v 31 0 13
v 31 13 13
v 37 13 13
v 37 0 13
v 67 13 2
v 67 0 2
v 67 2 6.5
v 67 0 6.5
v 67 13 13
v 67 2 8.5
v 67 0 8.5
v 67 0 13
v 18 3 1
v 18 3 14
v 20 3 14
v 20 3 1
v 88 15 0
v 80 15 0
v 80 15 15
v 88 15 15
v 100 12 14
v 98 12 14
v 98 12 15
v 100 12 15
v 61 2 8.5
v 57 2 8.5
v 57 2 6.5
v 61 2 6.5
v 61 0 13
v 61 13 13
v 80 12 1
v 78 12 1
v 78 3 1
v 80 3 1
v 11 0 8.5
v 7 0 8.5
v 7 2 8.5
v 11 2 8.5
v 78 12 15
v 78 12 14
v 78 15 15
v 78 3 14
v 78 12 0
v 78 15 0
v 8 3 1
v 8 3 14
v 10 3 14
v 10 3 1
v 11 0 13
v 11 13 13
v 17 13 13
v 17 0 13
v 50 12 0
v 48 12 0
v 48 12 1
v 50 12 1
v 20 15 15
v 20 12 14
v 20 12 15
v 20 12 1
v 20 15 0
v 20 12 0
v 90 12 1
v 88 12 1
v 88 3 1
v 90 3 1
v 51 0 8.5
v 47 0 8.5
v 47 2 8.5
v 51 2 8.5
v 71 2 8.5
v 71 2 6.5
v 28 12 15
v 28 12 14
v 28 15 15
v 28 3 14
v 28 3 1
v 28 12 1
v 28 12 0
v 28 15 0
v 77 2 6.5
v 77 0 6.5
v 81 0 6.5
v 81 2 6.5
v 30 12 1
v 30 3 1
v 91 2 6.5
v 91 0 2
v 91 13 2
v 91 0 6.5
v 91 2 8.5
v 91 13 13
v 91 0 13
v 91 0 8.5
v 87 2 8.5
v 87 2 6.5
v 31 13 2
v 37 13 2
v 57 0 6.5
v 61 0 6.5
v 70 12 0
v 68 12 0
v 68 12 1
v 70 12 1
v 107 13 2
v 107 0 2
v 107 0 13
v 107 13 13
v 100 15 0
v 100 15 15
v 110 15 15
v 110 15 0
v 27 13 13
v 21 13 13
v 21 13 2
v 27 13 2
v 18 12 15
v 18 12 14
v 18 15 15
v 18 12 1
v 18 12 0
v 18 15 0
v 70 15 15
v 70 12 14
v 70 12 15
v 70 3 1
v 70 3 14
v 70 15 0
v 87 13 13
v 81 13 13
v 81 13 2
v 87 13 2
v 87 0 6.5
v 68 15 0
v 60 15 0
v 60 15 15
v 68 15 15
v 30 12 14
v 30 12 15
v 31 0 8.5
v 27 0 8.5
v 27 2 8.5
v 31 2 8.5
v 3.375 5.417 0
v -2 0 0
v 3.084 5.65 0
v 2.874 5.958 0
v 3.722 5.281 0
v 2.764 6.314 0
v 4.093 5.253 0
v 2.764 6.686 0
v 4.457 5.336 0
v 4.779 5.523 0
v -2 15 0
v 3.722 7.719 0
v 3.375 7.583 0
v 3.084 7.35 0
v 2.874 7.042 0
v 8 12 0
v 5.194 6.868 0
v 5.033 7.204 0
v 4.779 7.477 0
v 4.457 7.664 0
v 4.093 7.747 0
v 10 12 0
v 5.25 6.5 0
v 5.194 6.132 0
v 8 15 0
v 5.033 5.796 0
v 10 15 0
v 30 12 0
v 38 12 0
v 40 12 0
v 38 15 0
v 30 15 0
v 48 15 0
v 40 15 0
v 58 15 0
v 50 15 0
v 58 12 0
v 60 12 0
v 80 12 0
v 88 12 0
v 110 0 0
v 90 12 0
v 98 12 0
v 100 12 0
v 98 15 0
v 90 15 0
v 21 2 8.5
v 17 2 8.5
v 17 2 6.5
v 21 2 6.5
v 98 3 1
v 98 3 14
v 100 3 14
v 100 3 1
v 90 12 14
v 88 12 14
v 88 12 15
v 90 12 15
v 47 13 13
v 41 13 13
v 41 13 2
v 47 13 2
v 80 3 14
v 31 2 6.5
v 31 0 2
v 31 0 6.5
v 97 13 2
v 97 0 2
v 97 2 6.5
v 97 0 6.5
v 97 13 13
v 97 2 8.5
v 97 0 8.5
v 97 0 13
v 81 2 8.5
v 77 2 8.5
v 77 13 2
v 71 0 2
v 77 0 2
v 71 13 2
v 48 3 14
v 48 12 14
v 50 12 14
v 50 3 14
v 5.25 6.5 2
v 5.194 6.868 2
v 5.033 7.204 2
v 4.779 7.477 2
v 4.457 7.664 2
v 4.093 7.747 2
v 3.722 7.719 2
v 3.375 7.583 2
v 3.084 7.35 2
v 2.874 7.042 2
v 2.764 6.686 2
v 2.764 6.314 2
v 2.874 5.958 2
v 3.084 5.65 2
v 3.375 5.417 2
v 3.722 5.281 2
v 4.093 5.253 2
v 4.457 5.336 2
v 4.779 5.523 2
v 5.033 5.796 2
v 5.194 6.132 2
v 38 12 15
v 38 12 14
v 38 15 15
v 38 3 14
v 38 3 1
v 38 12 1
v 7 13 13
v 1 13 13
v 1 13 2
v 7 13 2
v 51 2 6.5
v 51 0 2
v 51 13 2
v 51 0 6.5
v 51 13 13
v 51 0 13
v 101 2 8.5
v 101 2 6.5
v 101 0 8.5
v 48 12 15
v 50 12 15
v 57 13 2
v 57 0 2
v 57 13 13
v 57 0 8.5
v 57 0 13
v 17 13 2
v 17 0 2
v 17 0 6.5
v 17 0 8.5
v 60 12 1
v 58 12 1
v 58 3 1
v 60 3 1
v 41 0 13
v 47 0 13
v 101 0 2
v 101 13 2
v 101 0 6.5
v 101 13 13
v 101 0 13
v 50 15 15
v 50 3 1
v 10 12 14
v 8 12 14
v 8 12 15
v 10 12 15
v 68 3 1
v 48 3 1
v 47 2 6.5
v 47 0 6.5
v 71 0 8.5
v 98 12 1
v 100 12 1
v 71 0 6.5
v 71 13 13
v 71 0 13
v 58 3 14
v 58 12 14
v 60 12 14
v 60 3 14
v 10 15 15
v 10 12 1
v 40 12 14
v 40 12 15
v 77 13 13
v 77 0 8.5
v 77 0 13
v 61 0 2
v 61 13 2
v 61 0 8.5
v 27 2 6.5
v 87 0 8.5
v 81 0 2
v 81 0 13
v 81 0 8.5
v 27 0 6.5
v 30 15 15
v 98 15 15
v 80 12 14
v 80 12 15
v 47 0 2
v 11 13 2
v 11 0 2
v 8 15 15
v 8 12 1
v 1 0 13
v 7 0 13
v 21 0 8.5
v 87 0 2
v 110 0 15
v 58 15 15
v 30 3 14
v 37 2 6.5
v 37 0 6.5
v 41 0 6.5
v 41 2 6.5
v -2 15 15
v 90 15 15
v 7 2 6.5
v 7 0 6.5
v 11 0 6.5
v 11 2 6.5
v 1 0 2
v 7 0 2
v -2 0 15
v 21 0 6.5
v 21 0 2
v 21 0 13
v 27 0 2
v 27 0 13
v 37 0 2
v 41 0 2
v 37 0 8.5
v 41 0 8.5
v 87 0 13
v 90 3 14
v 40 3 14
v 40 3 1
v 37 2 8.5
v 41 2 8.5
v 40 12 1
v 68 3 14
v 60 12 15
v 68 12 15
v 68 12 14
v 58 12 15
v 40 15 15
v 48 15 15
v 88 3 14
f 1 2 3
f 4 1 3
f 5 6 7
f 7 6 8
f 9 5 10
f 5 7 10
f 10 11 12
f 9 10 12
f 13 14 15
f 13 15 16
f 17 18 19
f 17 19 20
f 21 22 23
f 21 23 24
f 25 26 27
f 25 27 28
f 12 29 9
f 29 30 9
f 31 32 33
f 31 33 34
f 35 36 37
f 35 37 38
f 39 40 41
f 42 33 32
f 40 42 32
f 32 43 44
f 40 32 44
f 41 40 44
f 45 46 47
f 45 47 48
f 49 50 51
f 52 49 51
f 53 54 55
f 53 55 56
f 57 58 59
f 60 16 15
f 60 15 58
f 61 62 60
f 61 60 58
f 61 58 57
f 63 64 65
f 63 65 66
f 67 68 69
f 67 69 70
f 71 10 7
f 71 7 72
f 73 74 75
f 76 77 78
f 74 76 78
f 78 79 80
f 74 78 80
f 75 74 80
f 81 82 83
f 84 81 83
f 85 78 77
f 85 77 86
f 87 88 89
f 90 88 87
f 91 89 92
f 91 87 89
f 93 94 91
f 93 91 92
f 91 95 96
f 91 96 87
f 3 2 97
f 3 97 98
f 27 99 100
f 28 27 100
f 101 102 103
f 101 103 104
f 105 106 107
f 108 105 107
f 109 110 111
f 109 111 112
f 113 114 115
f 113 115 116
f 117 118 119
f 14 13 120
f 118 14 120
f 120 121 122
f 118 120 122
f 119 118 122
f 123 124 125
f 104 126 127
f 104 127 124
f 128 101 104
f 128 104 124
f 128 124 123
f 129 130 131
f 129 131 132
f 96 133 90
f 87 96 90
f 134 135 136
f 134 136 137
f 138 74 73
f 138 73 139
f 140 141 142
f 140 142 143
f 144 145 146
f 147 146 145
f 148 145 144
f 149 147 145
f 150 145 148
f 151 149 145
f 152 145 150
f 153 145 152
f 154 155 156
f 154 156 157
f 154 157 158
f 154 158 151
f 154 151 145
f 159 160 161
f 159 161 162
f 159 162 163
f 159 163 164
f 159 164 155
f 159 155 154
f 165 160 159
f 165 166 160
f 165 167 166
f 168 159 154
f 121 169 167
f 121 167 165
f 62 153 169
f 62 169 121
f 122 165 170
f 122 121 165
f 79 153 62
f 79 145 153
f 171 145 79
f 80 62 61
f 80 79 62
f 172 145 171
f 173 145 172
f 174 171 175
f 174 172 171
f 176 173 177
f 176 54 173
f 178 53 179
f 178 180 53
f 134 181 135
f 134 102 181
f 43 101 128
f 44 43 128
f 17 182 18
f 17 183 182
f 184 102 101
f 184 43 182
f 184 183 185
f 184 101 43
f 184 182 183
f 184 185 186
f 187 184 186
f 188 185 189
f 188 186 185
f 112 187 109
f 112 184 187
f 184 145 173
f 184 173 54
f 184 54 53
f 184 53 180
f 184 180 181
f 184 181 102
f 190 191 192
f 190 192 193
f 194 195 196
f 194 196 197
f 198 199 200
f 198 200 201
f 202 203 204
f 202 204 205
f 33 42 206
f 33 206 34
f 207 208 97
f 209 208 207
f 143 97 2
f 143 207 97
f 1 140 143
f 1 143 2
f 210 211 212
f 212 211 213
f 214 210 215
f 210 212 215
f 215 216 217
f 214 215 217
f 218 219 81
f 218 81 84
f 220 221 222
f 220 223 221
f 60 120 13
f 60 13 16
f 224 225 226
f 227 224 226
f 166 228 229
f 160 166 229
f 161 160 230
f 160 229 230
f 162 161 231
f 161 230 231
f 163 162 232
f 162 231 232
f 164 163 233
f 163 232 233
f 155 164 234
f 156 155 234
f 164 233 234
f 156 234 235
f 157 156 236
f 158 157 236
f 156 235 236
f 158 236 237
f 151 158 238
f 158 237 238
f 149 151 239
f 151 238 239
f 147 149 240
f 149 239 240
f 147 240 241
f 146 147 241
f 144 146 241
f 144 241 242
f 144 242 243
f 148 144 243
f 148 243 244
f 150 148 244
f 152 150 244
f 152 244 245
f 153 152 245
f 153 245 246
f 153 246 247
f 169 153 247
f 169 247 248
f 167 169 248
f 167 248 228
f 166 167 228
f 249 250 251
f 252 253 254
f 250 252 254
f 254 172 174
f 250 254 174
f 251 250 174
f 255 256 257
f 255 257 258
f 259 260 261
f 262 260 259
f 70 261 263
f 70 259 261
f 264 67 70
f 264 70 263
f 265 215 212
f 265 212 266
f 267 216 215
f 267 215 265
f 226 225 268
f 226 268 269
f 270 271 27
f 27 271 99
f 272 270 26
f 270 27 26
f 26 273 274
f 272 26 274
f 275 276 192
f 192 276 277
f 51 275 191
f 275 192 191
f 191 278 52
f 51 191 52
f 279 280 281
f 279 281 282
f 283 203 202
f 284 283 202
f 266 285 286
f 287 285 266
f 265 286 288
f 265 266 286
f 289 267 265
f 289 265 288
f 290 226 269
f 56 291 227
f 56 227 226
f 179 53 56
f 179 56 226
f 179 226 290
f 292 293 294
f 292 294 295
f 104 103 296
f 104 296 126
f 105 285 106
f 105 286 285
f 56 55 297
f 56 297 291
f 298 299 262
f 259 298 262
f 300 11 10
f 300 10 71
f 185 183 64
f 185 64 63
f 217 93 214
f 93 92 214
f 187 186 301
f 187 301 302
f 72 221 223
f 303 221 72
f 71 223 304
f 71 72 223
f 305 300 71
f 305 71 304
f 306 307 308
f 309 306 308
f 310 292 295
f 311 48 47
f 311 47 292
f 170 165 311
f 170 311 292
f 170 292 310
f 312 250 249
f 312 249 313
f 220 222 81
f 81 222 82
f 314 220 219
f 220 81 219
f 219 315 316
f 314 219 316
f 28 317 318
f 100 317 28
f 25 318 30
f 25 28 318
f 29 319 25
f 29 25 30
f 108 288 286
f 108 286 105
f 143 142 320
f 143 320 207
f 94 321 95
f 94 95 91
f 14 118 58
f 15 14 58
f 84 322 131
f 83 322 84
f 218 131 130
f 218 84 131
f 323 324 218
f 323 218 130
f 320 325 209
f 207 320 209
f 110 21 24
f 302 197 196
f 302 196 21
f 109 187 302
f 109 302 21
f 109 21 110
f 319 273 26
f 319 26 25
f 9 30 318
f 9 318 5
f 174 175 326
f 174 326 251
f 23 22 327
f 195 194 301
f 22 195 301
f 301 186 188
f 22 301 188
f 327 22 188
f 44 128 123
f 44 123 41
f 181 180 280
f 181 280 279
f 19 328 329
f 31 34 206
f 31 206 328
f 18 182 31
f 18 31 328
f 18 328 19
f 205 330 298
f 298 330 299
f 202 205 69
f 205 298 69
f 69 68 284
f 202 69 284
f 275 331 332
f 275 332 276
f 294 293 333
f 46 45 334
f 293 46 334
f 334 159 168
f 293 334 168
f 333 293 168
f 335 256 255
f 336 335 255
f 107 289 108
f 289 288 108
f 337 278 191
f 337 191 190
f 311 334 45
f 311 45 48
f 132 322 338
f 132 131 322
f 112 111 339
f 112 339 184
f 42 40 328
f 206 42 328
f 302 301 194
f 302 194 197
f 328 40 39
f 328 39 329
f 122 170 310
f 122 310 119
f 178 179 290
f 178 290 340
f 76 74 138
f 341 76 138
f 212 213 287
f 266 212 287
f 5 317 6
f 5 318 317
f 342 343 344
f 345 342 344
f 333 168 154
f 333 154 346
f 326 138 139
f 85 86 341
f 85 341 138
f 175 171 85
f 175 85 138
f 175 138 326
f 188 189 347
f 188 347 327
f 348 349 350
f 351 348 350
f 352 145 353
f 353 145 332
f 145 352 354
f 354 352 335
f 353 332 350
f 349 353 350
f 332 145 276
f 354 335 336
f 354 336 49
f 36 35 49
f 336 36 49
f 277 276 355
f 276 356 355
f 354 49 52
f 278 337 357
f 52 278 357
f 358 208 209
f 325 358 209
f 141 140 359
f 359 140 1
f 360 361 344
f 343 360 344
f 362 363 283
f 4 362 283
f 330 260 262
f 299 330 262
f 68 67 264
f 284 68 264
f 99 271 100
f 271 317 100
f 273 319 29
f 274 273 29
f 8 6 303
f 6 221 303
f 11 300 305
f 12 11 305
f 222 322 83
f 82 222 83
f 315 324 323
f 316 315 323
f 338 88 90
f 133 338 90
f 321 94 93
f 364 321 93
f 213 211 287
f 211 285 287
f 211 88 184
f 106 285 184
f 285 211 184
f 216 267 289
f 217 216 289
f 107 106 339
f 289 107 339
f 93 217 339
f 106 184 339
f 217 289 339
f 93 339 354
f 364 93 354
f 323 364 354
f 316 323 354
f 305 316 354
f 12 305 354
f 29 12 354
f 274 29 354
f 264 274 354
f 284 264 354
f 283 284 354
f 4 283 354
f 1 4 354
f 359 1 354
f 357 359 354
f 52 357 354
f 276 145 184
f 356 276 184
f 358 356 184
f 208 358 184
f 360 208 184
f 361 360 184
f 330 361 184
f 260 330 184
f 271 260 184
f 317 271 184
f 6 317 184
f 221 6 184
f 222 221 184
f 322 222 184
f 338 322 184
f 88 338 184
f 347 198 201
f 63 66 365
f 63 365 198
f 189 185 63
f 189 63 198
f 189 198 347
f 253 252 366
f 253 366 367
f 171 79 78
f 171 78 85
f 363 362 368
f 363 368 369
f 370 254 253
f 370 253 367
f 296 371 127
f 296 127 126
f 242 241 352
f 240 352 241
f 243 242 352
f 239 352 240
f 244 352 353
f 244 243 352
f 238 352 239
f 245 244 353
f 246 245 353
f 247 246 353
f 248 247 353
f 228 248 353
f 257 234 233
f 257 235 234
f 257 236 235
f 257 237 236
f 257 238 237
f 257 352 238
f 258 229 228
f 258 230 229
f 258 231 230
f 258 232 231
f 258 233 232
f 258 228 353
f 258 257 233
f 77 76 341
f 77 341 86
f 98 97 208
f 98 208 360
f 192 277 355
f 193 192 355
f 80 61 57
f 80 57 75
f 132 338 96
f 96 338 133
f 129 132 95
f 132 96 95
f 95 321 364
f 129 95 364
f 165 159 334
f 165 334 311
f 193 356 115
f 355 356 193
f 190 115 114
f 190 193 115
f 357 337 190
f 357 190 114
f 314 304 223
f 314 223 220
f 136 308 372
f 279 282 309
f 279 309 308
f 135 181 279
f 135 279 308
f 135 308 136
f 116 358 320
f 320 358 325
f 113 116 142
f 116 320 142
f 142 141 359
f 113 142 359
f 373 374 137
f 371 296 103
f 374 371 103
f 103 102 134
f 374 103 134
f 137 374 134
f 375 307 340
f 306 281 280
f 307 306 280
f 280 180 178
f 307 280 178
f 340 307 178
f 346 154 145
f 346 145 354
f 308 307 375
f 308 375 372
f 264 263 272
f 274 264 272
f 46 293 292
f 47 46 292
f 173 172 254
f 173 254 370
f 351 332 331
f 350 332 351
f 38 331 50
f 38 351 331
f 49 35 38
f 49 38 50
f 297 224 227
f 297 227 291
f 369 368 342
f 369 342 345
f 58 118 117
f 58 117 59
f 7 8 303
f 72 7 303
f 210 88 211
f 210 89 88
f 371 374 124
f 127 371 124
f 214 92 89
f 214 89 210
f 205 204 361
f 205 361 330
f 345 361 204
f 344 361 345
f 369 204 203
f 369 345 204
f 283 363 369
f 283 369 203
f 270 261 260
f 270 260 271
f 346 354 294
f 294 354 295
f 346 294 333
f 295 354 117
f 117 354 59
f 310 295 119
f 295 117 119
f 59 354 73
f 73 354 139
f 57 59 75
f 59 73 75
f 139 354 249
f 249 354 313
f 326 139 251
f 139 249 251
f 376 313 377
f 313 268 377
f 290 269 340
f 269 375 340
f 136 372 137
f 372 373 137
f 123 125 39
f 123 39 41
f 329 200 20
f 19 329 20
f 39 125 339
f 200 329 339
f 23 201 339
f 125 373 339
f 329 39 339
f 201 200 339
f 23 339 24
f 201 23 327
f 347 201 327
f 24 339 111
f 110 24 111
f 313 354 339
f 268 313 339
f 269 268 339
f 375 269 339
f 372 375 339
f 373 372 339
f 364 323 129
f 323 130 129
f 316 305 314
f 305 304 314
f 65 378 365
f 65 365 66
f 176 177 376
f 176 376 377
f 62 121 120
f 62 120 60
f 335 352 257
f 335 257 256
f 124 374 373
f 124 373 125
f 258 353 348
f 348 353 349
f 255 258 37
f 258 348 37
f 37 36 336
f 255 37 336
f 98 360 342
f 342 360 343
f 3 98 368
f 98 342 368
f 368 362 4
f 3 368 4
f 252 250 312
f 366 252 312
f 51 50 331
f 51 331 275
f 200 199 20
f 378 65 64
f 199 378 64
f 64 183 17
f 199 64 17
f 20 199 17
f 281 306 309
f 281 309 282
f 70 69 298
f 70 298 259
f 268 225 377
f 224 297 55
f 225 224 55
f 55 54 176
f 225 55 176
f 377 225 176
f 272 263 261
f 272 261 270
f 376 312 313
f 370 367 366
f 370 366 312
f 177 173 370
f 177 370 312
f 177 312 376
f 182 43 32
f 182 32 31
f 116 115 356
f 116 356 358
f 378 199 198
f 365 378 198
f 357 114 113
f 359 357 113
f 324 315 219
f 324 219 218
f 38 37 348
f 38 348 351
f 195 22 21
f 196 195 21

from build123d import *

# Parameters (mm, degrees)
SKETCH1_W                       = 8
SKETCH1_H                       = 15
FIRST_CHAMBER_BLOCK_DEPTH       = 15
SKETCH2_W                       = 6
SKETCH2_H                       = 11
FIRST_CHAMBER_CAVITY_DEPTH      = 13
SKETCH3_W                       = 15
SKETCH3_H                       = 3
CHAMBER_SPACER_DEPTH            = 2
PATTERN_CHAMBERS_COUNT          = 11
PATTERN_CHAMBERS_PITCH          = 10
SKETCH4_W                       = 15
SKETCH4_H                       = 12
THICKEN_END_1_DEPTH             = 2
SKETCH5_W                       = 15
SKETCH5_H                       = 15
THICKEN_END_2_DEPTH             = 2
SKETCH6_W                       = 94
SKETCH6_H                       = 2
CENTRAL_AIR_CHANNEL_DEPTH       = 2
SKETCH7_W                       = 108
SKETCH7_H                       = 13
SKETCH7_W_2                     = 106
SKETCH7_H_2                     = 11
BONDING_RIDGE_DEPTH             = 2
SKETCH9_W                       = 2
SKETCH9_H                       = 2.5
BONDING_BUMPS_DEPTH             = 2
PATTERN_BONDING_BUMPS_COUNT     = 10
PATTERN_BONDING_BUMPS_PITCH     = 10
SKIZZE1_W                       = 112
SKIZZE1_H                       = 15
SCHNITT_LINEAR_AUSTRAGEN1_DEPTH = 113.026782512
SKIZZE2_W                       = 2
SKIZZE2_H                       = 1
AUFSATZ_LINEAR_AUSTRAGEN1_DEPTH = 9
LINEARES_MUSTER1_COUNT          = 10
LINEARES_MUSTER1_PITCH          = 10
SKIZZE4_R                       = 1.25
SCHNITT_LINEAR_AUSTRAGEN3_DEPTH = 112.776562839


with BuildPart() as part:
    # Sketch1 → first chamber block (new body)
    with BuildSketch(Plane.XY):
        with Locations((4, 7.5)):
            Rectangle(SKETCH1_W, SKETCH1_H)
    extrude(amount=FIRST_CHAMBER_BLOCK_DEPTH)

    # Sketch2 → first chamber cavity (cut)
    with BuildSketch(Plane.XZ):
        with Locations((4, 7.5)):
            Rectangle(SKETCH2_W, SKETCH2_H)
    extrude(amount=-FIRST_CHAMBER_CAVITY_DEPTH, mode=Mode.SUBTRACT)

    # Sketch3 → chamber spacer (add)
    with BuildSketch(Plane(origin=(8, 0, 0), x_dir=(0, 0, -1), z_dir=(1, 0, 0))):
        with Locations((-7.5, 1.5)):
            Rectangle(SKETCH3_W, SKETCH3_H)
    extrude(amount=CHAMBER_SPACER_DEPTH)


with BuildPart() as pattern_chambers_1:
    # pattern chambers: pattern copy
    add(part.part.moved(Location(Vector(1, 0, 0) * (1 * PATTERN_CHAMBERS_PITCH))))


with BuildPart() as pattern_chambers_2:
    # pattern chambers: pattern copy
    add(part.part.moved(Location(Vector(1, 0, 0) * (2 * PATTERN_CHAMBERS_PITCH))))


with BuildPart() as pattern_chambers_3:
    # pattern chambers: pattern copy
    add(part.part.moved(Location(Vector(1, 0, 0) * (3 * PATTERN_CHAMBERS_PITCH))))


with BuildPart() as pattern_chambers_4:
    # pattern chambers: pattern copy
    add(part.part.moved(Location(Vector(1, 0, 0) * (4 * PATTERN_CHAMBERS_PITCH))))


with BuildPart() as pattern_chambers_5:
    # pattern chambers: pattern copy
    add(part.part.moved(Location(Vector(1, 0, 0) * (5 * PATTERN_CHAMBERS_PITCH))))


with BuildPart() as pattern_chambers_6:
    # pattern chambers: pattern copy
    add(part.part.moved(Location(Vector(1, 0, 0) * (6 * PATTERN_CHAMBERS_PITCH))))


with BuildPart() as pattern_chambers_7:
    # pattern chambers: pattern copy
    add(part.part.moved(Location(Vector(1, 0, 0) * (7 * PATTERN_CHAMBERS_PITCH))))


with BuildPart() as pattern_chambers_8:
    # pattern chambers: pattern copy
    add(part.part.moved(Location(Vector(1, 0, 0) * (8 * PATTERN_CHAMBERS_PITCH))))


with BuildPart() as pattern_chambers_9:
    # pattern chambers: pattern copy
    add(part.part.moved(Location(Vector(1, 0, 0) * (9 * PATTERN_CHAMBERS_PITCH))))


with BuildPart() as pattern_chambers_10:
    # pattern chambers: pattern copy
    add(part.part.moved(Location(Vector(1, 0, 0) * (10 * PATTERN_CHAMBERS_PITCH))))

    # combine into 1 solid body: union pattern chambers_9, pattern chambers_8, pattern chambers_7, pattern chambers_6, pattern chambers_5, pattern chambers_4, pattern chambers_3, pattern chambers_2, pattern chambers_1, part
    add(pattern_chambers_9.part)
    add(pattern_chambers_8.part)
    add(pattern_chambers_7.part)
    add(pattern_chambers_6.part)
    add(pattern_chambers_5.part)
    add(pattern_chambers_4.part)
    add(pattern_chambers_3.part)
    add(pattern_chambers_2.part)
    add(pattern_chambers_1.part)
    add(part.part)

    # Sketch4 → thicken end 1 (add)
    with BuildSketch(Plane(origin=(108, 0, 0), x_dir=(0, 0, -1), z_dir=(1, 0, 0))):
        with Locations((-7.5, 9)):
            Rectangle(SKETCH4_W, SKETCH4_H)
    extrude(amount=THICKEN_END_1_DEPTH)

    # Sketch5 → thicken end 2 (add)
    with BuildSketch(Plane.ZY):
        with Locations((7.5, 7.5)):
            Rectangle(SKETCH5_W, SKETCH5_H)
    extrude(amount=THICKEN_END_2_DEPTH)

    # Sketch6 → central air channel (cut)
    with BuildSketch(Plane.XZ):
        with Locations((54, 7.5)):
            Rectangle(SKETCH6_W, SKETCH6_H)
    extrude(amount=-CENTRAL_AIR_CHANNEL_DEPTH, mode=Mode.SUBTRACT)

    # Sketch7 → bonding ridge (add)
    with BuildSketch(Plane.XZ):
        with Locations((54, 7.5)):
            Rectangle(SKETCH7_W, SKETCH7_H)
        with Locations((54, 7.5)):
            Rectangle(SKETCH7_W_2, SKETCH7_H_2, mode=Mode.SUBTRACT)
    extrude(amount=BONDING_RIDGE_DEPTH)

    # Sketch9 → bonding bumps (add)
    with BuildSketch(Plane.XZ):
        with Locations((9, 10.75)):
            Rectangle(SKETCH9_W, SKETCH9_H)
        with Locations((9, 4.25)):
            Rectangle(SKETCH9_W, SKETCH9_H)
    bonding_bumps = extrude(amount=BONDING_BUMPS_DEPTH)

    # pattern bonding bumps: bonding bumps ×10
    with Locations(*[(i * PATTERN_BONDING_BUMPS_PITCH, 0, 0) for i in range(1, PATTERN_BONDING_BUMPS_COUNT)]):
        add(bonding_bumps)

    # Skizze1 → Schnitt-Linear austragen1 (cut, through all)
    with BuildSketch(Plane.XZ):
        with Locations((54, 7.5)):
            Rectangle(SKIZZE1_W, SKIZZE1_H)
    extrude(amount=SCHNITT_LINEAR_AUSTRAGEN1_DEPTH, mode=Mode.SUBTRACT)

    # Skizze2 → Aufsatz-Linear austragen1 (add)
    with BuildSketch(Plane(origin=(0, 3, 0), x_dir=(1, 0, 0), z_dir=(0, 1, 0))):
        with Locations((99, -0.5)):
            Rectangle(SKIZZE2_W, SKIZZE2_H)
        with Locations((99, -14.5)):
            Rectangle(SKIZZE2_W, SKIZZE2_H)
    aufsatz_linear_austragen1 = extrude(amount=AUFSATZ_LINEAR_AUSTRAGEN1_DEPTH)

    # Lineares Muster1: Aufsatz-Linear austragen1 ×10
    with Locations(*[(-i * LINEARES_MUSTER1_PITCH, 0, 0) for i in range(1, LINEARES_MUSTER1_COUNT)]):
        add(aufsatz_linear_austragen1)

    # Skizze4 → Schnitt-Linear austragen3 (cut, through all)
    with BuildSketch(Plane.XY.offset(2)):
        with Locations((4, 6.5)):
            Circle(SKIZZE4_R)
    extrude(amount=-SCHNITT_LINEAR_AUSTRAGEN3_DEPTH, mode=Mode.SUBTRACT)


solid = pattern_chambers_10.part
